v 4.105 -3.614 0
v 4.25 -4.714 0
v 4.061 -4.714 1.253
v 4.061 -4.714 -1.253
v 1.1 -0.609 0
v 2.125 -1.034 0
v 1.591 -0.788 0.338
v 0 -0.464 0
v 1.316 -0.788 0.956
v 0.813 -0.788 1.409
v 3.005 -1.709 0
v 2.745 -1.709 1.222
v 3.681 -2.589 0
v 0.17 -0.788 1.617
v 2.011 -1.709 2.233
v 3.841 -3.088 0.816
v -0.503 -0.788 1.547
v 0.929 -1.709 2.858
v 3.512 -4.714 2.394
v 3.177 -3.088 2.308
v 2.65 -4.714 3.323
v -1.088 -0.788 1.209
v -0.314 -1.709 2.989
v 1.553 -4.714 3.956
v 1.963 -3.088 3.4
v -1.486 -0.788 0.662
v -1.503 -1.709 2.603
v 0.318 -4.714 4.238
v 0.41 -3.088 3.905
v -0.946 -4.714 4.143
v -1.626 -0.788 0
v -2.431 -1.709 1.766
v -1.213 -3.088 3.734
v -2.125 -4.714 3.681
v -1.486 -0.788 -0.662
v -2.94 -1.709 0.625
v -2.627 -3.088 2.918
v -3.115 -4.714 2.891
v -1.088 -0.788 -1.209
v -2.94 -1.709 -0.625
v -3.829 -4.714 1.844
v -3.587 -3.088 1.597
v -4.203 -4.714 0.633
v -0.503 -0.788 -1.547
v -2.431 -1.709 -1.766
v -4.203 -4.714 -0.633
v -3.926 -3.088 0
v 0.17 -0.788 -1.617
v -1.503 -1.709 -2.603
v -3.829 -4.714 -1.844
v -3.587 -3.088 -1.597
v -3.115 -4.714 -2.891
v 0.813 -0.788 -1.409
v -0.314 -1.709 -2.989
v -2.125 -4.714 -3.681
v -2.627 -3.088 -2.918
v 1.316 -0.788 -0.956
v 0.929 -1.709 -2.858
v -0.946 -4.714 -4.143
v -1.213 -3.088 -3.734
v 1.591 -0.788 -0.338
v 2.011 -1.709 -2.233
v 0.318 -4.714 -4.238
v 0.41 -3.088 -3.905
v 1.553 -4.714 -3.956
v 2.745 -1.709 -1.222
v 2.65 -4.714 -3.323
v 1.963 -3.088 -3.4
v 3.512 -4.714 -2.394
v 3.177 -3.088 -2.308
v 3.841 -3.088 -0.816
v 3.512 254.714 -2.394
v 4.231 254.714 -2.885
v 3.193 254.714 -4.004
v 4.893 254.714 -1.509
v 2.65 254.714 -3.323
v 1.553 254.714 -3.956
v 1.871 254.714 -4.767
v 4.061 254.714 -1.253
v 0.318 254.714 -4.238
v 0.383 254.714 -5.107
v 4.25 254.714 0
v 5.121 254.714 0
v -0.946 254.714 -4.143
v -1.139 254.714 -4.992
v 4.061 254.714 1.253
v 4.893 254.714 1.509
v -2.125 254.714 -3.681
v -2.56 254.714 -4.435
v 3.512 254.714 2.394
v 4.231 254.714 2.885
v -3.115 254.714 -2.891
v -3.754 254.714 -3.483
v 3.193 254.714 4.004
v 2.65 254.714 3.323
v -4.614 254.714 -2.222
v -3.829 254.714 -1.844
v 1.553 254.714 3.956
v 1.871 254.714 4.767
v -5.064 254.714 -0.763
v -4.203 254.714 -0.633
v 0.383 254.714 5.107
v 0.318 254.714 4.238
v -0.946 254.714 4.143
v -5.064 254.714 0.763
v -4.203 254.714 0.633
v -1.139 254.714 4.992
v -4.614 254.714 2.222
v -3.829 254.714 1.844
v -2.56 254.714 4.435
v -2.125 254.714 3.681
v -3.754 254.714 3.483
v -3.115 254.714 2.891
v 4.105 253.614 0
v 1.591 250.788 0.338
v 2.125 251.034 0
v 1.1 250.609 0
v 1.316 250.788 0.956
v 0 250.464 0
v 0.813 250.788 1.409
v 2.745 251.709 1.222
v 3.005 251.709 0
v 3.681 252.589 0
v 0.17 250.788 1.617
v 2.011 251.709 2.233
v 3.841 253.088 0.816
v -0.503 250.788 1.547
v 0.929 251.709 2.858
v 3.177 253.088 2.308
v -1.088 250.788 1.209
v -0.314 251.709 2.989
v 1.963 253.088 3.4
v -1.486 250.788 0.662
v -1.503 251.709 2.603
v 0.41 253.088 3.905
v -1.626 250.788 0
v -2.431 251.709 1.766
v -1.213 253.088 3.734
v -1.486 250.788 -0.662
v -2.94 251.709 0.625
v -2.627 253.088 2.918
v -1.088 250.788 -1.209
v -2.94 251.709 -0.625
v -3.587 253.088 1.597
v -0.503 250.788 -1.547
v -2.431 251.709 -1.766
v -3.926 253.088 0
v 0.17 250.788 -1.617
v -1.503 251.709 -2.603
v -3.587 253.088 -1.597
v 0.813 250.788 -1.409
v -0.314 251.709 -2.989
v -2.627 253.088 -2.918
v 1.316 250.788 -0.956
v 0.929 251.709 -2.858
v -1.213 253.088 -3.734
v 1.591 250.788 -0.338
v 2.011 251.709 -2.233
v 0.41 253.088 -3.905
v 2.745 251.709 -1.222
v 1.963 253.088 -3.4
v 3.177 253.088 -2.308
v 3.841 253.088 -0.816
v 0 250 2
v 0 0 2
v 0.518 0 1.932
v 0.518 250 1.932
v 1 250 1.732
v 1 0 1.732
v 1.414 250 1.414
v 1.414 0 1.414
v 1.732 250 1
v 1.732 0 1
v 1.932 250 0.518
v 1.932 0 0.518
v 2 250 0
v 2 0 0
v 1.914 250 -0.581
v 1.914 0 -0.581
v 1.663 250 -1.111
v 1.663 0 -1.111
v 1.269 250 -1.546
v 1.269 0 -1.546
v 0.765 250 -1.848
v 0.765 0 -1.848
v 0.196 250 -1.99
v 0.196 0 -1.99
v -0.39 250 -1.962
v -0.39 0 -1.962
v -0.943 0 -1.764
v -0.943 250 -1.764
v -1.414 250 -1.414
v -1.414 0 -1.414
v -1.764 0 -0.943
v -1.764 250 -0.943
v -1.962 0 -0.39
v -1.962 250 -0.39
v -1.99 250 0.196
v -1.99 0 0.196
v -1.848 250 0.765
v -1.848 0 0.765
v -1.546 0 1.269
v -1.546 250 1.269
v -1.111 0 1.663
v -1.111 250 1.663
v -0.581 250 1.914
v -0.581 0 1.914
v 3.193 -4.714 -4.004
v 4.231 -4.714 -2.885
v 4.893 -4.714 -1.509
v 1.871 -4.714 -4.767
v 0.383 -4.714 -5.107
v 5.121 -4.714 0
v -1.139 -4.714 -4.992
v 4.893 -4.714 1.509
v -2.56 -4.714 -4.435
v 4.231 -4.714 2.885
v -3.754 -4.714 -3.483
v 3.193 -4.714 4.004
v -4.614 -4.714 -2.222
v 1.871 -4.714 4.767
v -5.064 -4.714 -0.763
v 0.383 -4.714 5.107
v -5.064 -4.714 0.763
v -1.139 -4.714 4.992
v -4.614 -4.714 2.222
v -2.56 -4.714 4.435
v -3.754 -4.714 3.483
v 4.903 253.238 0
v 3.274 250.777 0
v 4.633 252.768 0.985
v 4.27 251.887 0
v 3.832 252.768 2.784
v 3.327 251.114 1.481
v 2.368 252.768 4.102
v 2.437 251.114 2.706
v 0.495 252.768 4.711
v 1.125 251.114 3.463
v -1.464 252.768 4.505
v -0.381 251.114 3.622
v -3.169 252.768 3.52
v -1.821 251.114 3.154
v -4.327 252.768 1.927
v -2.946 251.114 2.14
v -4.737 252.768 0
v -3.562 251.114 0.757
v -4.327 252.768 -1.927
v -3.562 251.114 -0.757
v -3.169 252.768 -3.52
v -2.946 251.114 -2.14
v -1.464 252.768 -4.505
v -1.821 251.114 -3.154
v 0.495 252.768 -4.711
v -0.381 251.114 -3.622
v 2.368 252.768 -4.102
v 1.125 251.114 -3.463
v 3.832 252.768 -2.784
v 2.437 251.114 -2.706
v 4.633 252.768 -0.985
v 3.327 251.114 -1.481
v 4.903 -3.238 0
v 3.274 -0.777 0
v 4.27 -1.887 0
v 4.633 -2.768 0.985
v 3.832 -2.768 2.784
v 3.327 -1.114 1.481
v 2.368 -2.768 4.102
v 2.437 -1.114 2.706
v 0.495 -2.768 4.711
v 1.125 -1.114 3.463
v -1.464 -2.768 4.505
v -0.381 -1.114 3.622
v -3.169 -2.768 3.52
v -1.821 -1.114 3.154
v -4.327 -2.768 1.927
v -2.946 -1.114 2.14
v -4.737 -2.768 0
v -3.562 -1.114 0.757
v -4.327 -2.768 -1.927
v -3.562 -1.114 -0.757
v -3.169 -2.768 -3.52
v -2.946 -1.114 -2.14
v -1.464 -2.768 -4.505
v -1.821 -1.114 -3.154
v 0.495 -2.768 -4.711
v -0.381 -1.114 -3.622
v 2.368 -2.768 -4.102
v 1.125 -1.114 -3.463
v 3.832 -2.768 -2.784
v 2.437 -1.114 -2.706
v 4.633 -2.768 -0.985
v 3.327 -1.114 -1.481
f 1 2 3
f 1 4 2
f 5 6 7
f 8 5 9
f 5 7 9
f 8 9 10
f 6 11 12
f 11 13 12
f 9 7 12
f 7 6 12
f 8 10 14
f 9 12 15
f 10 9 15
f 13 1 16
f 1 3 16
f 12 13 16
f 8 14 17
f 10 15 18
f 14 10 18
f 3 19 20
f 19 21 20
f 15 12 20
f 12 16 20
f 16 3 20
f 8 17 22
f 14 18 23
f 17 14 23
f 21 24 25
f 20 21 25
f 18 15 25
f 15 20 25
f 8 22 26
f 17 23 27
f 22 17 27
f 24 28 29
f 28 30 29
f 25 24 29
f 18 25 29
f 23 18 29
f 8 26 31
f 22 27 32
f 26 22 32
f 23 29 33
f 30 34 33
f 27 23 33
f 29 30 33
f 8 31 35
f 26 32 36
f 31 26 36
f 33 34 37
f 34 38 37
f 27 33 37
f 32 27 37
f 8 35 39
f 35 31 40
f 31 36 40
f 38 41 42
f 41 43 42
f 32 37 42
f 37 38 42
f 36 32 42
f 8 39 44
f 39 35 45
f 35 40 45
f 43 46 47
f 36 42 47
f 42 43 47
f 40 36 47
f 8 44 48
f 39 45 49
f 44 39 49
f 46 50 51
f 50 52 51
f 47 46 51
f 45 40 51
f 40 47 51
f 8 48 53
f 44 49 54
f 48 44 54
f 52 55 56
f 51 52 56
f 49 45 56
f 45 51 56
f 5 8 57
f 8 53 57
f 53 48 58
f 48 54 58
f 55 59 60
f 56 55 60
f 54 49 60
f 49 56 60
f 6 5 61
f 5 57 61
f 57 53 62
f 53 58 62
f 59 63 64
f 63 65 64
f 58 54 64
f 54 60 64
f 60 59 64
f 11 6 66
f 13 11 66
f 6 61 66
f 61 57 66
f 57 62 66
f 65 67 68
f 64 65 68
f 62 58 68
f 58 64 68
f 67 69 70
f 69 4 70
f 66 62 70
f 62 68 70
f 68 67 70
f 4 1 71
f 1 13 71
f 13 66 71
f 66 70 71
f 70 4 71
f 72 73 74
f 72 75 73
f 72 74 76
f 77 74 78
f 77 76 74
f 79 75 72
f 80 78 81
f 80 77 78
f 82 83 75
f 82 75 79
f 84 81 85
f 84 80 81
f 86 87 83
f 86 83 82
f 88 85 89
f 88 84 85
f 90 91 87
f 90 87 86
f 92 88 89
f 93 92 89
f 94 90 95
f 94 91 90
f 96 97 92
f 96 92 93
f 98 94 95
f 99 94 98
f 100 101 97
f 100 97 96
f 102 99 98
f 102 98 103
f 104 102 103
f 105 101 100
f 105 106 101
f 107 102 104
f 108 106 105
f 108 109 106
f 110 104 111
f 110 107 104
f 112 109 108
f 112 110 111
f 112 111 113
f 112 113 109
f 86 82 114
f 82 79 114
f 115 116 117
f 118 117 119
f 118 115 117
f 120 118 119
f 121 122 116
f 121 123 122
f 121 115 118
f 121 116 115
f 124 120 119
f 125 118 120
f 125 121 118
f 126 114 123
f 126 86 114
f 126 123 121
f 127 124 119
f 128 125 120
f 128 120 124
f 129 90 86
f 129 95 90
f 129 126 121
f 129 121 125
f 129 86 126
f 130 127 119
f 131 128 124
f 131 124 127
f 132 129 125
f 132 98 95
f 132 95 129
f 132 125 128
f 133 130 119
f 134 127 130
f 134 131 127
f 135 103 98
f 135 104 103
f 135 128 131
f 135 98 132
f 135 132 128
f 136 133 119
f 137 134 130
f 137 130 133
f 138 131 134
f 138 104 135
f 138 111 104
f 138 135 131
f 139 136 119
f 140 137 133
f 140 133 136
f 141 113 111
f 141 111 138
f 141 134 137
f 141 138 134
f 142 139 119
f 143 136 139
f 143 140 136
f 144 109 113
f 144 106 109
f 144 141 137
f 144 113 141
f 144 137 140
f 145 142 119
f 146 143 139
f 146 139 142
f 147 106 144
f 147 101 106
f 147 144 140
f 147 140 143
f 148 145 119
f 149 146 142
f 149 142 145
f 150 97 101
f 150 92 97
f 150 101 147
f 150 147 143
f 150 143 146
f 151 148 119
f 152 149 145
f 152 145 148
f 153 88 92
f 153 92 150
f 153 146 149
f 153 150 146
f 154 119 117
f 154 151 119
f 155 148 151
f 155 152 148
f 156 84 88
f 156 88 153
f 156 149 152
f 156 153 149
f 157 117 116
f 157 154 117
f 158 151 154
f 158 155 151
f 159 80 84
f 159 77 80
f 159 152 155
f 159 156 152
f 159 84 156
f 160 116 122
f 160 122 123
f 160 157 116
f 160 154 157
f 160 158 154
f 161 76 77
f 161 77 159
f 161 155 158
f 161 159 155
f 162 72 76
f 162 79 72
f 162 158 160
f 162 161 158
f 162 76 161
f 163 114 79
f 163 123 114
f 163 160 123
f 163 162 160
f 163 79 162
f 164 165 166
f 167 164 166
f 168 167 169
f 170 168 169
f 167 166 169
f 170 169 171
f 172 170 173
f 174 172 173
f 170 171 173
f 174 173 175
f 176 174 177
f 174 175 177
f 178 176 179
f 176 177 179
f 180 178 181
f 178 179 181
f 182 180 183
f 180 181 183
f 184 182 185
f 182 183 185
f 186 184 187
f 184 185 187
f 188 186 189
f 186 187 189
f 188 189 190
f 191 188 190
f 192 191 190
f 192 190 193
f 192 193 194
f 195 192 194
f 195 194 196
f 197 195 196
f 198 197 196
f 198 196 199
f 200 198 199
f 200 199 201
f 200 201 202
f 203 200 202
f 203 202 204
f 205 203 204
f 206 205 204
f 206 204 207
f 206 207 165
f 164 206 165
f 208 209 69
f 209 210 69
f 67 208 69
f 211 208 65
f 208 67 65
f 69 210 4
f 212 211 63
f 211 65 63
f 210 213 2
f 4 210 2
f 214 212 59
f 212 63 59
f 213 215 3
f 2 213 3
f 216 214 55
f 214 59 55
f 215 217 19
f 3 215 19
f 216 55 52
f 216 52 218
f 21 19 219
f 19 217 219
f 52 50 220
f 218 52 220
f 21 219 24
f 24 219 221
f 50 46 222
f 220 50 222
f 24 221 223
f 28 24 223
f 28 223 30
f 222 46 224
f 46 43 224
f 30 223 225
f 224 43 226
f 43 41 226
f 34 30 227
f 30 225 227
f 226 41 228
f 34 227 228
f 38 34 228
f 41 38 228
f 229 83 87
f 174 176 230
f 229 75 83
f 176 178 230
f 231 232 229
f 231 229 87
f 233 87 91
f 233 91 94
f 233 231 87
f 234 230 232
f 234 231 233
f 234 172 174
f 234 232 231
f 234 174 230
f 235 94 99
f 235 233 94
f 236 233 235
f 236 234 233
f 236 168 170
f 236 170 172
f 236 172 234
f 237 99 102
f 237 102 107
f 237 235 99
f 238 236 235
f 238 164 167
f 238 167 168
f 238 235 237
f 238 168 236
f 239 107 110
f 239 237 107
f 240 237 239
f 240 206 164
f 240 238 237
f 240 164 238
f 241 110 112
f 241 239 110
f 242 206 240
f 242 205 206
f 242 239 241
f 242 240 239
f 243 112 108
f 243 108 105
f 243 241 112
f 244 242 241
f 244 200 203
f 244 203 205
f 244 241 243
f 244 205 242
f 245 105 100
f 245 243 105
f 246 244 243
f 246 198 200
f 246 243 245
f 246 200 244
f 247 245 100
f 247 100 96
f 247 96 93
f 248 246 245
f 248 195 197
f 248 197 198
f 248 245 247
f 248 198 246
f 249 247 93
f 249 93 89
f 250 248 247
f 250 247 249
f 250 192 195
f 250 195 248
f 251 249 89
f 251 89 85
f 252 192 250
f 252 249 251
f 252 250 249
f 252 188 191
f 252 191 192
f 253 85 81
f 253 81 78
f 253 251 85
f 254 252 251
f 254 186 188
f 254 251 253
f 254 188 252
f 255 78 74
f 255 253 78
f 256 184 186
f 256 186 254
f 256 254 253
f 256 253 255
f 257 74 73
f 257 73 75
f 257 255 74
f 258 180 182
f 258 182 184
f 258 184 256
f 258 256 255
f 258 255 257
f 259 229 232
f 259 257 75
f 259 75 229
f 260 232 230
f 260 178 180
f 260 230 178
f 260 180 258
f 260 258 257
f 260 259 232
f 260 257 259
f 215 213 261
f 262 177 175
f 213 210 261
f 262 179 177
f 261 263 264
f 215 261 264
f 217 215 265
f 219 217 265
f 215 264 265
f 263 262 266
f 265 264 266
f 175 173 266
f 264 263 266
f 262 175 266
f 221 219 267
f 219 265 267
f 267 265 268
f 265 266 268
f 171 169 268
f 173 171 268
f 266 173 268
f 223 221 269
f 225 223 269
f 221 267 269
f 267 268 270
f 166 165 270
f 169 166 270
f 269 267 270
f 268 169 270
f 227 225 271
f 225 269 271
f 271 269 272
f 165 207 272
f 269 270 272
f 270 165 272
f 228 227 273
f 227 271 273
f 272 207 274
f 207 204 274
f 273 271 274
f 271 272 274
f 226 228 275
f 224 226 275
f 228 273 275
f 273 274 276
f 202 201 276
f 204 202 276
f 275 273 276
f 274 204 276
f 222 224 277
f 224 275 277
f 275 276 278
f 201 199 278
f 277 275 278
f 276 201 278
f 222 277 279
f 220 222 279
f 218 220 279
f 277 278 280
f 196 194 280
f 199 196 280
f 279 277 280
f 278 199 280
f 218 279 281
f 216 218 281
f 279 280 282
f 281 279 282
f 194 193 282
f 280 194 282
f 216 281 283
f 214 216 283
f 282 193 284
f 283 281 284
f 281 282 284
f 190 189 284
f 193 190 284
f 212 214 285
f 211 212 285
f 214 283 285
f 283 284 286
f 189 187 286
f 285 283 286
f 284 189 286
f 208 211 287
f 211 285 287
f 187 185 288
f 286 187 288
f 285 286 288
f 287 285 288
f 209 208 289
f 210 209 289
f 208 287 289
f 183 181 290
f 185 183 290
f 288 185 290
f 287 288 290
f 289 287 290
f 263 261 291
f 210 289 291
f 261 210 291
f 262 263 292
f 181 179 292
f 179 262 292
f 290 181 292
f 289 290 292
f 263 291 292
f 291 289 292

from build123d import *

# Parameters (mm, degrees)
SKETCH1_R           = 2
BOSS_EXTRUDE1_DEPTH = 250


with BuildPart() as part:
    # Sketch1 → Boss-Extrude1 (new body)
    with BuildSketch(Plane(origin=(0, 0, 0), x_dir=(1, 0, 0), z_dir=(0, 1, 0))):
        with Locations(Location((0, 0, 0), (0, 0, 270))):
            Circle(SKETCH1_R)
    extrude(amount=BOSS_EXTRUDE1_DEPTH)

    # Sketch2 → Revolve1 (revolve)
    with BuildSketch(Plane.XY):
        with BuildLine():
            Line((4.25, 254.7141137), (5.120826884, 254.7141137))
            ThreePointArc((5.120826884, 254.7141137), (3.620971415, 251.093142285), (0, 249.593286816))
            Line((0, 249.593286816), (0, 250.4641137))
            ThreePointArc((0, 250.4641137), (3.00520382, 251.70890988), (4.25, 254.7141137))
        make_face()
    revolve1 = revolve(axis=Axis((0, 250.4641137, 0), (0, -1, 0)))

    # Mirror1: Revolve1 across plane
    add(revolve1.mirror(Plane(origin=(0, 125, 0), x_dir=(0, 0, 1), z_dir=(0, -1, 0))))


solid = part.part
